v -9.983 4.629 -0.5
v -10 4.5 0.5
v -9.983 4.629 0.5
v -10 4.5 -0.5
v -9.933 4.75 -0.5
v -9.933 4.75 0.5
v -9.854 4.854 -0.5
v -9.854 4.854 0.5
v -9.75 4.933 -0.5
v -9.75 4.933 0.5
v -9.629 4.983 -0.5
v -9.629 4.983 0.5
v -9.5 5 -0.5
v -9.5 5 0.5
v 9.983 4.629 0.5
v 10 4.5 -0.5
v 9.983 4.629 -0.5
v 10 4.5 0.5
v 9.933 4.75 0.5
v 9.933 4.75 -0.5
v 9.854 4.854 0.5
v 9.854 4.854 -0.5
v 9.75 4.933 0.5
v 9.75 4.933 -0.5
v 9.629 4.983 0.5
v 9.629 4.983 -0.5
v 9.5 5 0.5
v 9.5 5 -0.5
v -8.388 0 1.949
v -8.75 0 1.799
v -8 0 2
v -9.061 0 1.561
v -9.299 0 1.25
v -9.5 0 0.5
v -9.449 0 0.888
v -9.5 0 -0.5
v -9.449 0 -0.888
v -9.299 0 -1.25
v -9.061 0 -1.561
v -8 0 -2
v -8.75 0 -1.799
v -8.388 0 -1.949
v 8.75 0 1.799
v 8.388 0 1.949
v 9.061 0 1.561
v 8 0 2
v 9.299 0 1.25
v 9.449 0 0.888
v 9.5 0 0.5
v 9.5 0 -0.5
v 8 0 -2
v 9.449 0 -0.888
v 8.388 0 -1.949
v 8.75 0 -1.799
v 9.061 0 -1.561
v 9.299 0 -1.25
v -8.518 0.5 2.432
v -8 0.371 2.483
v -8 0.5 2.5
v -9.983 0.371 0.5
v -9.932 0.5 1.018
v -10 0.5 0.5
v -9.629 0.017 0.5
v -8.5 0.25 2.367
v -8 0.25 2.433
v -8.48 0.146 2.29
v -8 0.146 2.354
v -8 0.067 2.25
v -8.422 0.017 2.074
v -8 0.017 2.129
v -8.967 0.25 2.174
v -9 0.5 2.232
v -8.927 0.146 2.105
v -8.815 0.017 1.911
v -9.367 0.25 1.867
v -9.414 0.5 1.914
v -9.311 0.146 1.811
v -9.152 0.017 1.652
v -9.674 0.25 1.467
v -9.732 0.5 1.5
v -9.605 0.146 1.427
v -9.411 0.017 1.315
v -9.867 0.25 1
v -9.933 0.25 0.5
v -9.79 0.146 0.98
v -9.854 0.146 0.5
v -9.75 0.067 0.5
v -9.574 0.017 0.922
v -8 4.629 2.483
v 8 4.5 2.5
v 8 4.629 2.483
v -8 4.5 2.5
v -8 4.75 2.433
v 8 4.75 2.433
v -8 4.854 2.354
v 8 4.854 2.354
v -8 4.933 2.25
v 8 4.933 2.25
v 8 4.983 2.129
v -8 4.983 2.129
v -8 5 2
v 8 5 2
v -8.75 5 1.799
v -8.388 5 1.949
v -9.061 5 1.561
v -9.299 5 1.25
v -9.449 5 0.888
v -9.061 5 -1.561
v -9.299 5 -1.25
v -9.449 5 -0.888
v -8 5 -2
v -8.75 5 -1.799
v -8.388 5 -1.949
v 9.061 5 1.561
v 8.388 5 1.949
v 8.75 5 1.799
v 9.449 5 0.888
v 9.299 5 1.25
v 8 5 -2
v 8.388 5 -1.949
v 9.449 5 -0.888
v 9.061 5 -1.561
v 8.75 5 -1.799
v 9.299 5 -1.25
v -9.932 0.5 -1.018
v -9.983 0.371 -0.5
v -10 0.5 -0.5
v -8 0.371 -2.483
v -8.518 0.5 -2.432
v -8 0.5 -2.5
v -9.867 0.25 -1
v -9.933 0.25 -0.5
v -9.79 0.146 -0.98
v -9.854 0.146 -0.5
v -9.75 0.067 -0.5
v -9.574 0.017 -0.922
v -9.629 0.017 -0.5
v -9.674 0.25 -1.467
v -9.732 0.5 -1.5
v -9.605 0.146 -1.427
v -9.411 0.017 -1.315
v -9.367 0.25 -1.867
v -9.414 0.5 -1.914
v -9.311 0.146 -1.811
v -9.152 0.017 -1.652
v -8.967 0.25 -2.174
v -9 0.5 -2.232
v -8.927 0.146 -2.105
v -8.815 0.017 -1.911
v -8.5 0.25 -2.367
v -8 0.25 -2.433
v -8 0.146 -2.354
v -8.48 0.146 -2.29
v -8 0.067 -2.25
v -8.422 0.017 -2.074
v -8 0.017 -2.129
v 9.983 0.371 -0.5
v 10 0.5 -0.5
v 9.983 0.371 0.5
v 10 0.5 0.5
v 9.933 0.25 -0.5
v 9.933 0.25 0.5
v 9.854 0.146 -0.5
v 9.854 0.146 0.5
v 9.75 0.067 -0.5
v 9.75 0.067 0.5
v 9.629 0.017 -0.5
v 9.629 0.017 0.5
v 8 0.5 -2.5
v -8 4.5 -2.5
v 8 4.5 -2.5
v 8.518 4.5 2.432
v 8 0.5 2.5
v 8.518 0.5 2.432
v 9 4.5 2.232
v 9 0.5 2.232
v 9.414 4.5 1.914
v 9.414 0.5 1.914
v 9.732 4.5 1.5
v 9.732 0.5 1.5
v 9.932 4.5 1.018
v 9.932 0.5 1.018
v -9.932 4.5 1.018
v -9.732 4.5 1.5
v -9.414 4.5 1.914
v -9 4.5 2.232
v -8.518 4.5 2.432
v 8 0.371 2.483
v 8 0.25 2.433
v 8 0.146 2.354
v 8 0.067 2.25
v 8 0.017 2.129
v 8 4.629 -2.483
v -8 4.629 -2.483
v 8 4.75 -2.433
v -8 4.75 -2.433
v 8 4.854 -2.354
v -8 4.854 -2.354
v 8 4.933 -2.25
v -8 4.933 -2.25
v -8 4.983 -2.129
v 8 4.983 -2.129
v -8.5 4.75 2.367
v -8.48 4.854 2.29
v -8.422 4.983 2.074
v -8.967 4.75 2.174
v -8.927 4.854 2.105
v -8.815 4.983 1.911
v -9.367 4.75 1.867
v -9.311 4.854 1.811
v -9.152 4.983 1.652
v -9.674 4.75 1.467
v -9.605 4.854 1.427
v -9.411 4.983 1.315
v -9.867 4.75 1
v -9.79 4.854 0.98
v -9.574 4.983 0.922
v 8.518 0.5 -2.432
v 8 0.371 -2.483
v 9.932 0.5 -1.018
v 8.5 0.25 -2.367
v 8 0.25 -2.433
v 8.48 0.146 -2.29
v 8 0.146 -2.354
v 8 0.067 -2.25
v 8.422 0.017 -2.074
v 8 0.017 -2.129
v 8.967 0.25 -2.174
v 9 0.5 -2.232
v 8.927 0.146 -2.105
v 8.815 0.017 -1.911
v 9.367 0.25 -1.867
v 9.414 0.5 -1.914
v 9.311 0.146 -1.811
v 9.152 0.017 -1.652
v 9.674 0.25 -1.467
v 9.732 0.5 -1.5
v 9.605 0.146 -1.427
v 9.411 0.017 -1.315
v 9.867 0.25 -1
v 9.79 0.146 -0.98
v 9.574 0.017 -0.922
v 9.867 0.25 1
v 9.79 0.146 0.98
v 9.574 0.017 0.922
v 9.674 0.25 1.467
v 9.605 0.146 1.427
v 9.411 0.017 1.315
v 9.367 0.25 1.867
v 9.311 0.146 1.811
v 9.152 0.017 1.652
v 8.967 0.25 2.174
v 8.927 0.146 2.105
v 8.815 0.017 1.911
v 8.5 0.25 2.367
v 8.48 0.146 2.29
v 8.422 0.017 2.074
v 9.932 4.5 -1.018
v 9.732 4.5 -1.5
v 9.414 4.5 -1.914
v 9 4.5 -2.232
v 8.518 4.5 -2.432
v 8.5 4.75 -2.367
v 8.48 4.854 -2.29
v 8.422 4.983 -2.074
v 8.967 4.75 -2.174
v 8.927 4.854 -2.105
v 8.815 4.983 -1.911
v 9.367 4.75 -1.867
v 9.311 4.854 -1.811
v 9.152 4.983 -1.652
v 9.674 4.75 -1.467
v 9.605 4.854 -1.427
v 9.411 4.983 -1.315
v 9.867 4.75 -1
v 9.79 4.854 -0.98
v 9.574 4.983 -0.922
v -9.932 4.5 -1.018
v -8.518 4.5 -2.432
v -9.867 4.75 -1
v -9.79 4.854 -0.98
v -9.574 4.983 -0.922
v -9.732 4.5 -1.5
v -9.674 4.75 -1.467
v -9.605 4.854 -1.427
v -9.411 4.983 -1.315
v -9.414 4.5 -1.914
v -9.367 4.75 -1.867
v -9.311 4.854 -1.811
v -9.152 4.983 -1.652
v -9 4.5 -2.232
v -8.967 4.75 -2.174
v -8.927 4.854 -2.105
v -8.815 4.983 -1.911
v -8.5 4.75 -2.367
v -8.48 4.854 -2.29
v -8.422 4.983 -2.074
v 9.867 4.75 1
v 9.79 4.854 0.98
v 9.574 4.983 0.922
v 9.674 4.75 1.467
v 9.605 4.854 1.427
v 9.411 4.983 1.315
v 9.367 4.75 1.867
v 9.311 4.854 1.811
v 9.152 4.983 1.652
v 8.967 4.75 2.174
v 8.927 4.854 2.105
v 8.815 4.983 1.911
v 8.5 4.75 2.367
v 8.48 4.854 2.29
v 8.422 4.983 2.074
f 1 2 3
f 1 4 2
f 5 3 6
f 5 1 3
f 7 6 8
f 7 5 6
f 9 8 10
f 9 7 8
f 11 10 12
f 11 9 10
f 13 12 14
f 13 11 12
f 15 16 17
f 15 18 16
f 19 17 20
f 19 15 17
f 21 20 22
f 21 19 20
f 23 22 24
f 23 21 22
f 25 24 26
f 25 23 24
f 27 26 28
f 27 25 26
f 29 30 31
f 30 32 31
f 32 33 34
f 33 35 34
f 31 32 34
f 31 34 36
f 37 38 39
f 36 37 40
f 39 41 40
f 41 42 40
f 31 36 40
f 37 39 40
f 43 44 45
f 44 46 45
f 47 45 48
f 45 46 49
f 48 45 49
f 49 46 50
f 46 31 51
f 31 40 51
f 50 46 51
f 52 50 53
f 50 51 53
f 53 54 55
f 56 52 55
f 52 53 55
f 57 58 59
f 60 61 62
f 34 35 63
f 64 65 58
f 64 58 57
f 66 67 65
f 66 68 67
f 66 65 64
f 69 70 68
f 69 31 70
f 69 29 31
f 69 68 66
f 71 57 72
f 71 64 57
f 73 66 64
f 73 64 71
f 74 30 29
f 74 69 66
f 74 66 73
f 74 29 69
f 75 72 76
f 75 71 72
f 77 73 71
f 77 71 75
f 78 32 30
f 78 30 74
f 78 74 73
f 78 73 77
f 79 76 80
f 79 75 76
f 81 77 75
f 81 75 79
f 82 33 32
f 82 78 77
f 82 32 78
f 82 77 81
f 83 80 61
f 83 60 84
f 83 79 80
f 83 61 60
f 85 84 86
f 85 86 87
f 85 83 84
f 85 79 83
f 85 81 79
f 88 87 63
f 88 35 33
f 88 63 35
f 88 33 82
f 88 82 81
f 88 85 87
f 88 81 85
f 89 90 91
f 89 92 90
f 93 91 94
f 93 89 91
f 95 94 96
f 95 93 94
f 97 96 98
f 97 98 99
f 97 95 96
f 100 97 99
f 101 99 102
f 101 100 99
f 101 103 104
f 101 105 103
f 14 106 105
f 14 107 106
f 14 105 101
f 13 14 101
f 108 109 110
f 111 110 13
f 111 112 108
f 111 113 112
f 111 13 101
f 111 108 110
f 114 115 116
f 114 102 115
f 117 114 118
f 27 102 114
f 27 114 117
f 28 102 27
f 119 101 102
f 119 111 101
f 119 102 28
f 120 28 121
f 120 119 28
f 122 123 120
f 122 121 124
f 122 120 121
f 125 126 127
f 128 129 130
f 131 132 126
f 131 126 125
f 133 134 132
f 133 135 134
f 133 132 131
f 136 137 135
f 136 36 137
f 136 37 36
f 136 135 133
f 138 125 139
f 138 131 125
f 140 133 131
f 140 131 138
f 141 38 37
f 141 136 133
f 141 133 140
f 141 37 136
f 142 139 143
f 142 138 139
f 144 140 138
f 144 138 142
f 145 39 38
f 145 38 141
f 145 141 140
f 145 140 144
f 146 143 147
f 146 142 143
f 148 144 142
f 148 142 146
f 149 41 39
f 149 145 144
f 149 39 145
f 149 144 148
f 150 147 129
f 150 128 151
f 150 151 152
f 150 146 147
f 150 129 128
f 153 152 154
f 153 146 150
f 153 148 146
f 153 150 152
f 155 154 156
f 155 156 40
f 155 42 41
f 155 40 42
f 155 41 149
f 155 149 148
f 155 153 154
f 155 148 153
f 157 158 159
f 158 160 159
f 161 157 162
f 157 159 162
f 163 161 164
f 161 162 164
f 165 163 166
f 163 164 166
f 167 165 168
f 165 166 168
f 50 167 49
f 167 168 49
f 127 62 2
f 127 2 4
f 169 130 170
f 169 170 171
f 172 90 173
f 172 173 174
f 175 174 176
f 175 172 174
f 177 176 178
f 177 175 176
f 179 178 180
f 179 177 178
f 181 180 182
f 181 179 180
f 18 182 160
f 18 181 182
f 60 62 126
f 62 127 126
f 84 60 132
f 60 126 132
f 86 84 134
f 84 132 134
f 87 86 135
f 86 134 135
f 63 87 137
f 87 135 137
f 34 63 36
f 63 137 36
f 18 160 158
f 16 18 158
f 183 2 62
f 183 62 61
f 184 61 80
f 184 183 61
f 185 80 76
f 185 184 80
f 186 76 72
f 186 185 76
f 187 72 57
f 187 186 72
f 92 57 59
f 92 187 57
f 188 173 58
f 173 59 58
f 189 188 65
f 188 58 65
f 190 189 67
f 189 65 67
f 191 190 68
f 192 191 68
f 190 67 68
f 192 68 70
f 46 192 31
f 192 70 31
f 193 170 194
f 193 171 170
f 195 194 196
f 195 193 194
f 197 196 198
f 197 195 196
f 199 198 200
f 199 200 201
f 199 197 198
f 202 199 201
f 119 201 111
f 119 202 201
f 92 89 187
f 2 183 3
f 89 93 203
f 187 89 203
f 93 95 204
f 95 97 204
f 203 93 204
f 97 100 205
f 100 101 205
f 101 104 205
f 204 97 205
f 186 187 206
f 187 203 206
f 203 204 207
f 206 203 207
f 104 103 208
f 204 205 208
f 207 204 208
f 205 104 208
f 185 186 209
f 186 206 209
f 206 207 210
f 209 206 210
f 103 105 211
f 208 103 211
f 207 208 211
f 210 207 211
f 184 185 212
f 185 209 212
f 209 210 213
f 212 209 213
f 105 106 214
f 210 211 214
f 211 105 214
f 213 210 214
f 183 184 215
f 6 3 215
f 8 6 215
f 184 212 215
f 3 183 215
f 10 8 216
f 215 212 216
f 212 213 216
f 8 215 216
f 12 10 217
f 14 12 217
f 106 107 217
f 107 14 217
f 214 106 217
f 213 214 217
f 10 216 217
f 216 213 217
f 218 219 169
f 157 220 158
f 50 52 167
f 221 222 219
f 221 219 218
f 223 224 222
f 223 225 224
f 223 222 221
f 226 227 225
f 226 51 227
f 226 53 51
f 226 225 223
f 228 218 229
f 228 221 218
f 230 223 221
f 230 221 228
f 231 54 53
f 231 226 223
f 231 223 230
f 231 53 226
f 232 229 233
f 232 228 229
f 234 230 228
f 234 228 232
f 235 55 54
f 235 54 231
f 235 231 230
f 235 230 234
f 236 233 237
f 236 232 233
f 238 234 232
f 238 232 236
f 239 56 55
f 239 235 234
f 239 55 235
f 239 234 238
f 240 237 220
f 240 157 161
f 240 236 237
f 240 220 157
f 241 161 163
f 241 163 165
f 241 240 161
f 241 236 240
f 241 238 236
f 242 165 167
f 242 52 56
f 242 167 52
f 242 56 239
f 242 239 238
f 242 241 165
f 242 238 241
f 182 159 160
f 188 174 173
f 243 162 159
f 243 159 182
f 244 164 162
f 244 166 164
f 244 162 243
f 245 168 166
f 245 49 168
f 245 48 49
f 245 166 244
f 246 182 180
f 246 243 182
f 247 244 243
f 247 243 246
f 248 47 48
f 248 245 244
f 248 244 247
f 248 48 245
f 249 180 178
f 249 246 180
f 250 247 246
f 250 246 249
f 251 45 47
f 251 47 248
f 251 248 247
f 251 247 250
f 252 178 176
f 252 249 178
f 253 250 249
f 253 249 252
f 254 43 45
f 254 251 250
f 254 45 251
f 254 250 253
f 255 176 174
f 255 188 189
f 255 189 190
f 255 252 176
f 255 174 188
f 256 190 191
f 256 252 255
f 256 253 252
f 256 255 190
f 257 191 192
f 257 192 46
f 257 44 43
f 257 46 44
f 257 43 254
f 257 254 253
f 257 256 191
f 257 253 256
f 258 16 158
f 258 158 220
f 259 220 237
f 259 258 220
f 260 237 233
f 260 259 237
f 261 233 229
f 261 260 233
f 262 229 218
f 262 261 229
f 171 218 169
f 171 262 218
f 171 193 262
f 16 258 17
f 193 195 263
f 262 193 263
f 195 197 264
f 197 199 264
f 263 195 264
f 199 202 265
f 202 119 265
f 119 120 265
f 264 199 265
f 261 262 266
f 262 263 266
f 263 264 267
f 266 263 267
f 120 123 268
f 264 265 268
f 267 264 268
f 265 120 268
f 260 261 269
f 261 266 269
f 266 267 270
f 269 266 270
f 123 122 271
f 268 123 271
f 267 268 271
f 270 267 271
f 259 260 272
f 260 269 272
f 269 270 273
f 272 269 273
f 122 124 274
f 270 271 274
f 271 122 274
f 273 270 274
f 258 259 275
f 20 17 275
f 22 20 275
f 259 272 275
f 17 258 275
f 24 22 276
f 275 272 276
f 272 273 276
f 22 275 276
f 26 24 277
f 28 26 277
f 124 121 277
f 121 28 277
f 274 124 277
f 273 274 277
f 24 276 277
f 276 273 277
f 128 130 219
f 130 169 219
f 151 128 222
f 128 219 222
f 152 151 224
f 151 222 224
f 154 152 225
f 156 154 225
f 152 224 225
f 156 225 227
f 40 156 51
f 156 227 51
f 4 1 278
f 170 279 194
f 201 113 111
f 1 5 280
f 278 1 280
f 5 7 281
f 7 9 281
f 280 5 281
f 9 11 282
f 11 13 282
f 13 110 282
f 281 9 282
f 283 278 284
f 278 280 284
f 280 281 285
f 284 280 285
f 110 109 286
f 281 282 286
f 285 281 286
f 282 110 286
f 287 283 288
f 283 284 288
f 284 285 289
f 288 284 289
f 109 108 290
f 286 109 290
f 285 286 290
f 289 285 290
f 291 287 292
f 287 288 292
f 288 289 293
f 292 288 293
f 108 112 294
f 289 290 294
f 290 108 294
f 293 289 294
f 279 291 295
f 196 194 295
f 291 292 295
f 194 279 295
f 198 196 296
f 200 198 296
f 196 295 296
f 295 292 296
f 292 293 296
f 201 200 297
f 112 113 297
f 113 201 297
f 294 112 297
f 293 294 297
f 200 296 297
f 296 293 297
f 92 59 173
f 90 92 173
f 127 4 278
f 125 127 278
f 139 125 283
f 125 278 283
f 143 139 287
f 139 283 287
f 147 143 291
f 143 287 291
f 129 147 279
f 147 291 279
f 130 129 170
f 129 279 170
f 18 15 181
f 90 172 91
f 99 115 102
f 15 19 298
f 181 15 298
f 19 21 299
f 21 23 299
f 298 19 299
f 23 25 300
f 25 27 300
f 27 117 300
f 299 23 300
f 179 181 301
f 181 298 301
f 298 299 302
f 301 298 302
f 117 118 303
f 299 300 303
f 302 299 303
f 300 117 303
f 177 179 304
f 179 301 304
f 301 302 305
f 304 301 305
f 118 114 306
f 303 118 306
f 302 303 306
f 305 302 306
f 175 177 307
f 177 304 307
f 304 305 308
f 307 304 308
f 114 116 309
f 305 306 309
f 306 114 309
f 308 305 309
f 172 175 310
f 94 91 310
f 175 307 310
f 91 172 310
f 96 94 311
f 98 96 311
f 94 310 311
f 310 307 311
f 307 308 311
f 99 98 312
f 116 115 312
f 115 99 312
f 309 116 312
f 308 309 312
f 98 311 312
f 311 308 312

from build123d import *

# Parameters (mm, degrees)
SKETCH_1_W      = 20
SKETCH_1_H      = 5
EXTRUDE_1_DEPTH = 5
FILLET_1_R      = 2
FILLET_2_R      = 0.5


with BuildPart() as part:
    # 草圖1 → 填料-伸長1 (new body)
    with BuildSketch(Plane(origin=(0, 0, 0), x_dir=(1, 0, 0), z_dir=(0, 1, 0))):
        Rectangle(SKETCH_1_W, SKETCH_1_H)
    extrude(amount=EXTRUDE_1_DEPTH)

    # 圓角1
    fillet_1_edges = [part.edges().sort_by_distance(p)[0] for p in [
        (10, 2.5, 2.5),
        (-10, 2.5, 2.5),
        (-10, 2.5, -2.5),
        (10, 2.5, -2.5),
    ]]
    fillet(fillet_1_edges, radius=FILLET_1_R)

    # 圓角2
    fillet_2_edges = [part.edges().sort_by_distance(p)[0] for p in [
        (-10, 0, 0),
        (-10, 5, 0),
        (10, 0, 0),
        (0, 0, 2.5),
        (0, 0, -2.5),
        (9.414213562, 0, -1.914213562),
        (9.414213562, 0, 1.914213562),
        (-9.414213562, 0, 1.914213562),
        (-9.414213562, 0, -1.914213562),
        (0, 5, -2.5),
        (10, 5, 0),
        (0, 5, 2.5),
        (9.414213562, 5, -1.914213562),
        (9.414213562, 5, 1.914213562),
        (-9.414213562, 5, 1.914213562),
        (-9.414213562, 5, -1.914213562),
    ]]
    fillet(fillet_2_edges, radius=FILLET_2_R)


solid = part.part
